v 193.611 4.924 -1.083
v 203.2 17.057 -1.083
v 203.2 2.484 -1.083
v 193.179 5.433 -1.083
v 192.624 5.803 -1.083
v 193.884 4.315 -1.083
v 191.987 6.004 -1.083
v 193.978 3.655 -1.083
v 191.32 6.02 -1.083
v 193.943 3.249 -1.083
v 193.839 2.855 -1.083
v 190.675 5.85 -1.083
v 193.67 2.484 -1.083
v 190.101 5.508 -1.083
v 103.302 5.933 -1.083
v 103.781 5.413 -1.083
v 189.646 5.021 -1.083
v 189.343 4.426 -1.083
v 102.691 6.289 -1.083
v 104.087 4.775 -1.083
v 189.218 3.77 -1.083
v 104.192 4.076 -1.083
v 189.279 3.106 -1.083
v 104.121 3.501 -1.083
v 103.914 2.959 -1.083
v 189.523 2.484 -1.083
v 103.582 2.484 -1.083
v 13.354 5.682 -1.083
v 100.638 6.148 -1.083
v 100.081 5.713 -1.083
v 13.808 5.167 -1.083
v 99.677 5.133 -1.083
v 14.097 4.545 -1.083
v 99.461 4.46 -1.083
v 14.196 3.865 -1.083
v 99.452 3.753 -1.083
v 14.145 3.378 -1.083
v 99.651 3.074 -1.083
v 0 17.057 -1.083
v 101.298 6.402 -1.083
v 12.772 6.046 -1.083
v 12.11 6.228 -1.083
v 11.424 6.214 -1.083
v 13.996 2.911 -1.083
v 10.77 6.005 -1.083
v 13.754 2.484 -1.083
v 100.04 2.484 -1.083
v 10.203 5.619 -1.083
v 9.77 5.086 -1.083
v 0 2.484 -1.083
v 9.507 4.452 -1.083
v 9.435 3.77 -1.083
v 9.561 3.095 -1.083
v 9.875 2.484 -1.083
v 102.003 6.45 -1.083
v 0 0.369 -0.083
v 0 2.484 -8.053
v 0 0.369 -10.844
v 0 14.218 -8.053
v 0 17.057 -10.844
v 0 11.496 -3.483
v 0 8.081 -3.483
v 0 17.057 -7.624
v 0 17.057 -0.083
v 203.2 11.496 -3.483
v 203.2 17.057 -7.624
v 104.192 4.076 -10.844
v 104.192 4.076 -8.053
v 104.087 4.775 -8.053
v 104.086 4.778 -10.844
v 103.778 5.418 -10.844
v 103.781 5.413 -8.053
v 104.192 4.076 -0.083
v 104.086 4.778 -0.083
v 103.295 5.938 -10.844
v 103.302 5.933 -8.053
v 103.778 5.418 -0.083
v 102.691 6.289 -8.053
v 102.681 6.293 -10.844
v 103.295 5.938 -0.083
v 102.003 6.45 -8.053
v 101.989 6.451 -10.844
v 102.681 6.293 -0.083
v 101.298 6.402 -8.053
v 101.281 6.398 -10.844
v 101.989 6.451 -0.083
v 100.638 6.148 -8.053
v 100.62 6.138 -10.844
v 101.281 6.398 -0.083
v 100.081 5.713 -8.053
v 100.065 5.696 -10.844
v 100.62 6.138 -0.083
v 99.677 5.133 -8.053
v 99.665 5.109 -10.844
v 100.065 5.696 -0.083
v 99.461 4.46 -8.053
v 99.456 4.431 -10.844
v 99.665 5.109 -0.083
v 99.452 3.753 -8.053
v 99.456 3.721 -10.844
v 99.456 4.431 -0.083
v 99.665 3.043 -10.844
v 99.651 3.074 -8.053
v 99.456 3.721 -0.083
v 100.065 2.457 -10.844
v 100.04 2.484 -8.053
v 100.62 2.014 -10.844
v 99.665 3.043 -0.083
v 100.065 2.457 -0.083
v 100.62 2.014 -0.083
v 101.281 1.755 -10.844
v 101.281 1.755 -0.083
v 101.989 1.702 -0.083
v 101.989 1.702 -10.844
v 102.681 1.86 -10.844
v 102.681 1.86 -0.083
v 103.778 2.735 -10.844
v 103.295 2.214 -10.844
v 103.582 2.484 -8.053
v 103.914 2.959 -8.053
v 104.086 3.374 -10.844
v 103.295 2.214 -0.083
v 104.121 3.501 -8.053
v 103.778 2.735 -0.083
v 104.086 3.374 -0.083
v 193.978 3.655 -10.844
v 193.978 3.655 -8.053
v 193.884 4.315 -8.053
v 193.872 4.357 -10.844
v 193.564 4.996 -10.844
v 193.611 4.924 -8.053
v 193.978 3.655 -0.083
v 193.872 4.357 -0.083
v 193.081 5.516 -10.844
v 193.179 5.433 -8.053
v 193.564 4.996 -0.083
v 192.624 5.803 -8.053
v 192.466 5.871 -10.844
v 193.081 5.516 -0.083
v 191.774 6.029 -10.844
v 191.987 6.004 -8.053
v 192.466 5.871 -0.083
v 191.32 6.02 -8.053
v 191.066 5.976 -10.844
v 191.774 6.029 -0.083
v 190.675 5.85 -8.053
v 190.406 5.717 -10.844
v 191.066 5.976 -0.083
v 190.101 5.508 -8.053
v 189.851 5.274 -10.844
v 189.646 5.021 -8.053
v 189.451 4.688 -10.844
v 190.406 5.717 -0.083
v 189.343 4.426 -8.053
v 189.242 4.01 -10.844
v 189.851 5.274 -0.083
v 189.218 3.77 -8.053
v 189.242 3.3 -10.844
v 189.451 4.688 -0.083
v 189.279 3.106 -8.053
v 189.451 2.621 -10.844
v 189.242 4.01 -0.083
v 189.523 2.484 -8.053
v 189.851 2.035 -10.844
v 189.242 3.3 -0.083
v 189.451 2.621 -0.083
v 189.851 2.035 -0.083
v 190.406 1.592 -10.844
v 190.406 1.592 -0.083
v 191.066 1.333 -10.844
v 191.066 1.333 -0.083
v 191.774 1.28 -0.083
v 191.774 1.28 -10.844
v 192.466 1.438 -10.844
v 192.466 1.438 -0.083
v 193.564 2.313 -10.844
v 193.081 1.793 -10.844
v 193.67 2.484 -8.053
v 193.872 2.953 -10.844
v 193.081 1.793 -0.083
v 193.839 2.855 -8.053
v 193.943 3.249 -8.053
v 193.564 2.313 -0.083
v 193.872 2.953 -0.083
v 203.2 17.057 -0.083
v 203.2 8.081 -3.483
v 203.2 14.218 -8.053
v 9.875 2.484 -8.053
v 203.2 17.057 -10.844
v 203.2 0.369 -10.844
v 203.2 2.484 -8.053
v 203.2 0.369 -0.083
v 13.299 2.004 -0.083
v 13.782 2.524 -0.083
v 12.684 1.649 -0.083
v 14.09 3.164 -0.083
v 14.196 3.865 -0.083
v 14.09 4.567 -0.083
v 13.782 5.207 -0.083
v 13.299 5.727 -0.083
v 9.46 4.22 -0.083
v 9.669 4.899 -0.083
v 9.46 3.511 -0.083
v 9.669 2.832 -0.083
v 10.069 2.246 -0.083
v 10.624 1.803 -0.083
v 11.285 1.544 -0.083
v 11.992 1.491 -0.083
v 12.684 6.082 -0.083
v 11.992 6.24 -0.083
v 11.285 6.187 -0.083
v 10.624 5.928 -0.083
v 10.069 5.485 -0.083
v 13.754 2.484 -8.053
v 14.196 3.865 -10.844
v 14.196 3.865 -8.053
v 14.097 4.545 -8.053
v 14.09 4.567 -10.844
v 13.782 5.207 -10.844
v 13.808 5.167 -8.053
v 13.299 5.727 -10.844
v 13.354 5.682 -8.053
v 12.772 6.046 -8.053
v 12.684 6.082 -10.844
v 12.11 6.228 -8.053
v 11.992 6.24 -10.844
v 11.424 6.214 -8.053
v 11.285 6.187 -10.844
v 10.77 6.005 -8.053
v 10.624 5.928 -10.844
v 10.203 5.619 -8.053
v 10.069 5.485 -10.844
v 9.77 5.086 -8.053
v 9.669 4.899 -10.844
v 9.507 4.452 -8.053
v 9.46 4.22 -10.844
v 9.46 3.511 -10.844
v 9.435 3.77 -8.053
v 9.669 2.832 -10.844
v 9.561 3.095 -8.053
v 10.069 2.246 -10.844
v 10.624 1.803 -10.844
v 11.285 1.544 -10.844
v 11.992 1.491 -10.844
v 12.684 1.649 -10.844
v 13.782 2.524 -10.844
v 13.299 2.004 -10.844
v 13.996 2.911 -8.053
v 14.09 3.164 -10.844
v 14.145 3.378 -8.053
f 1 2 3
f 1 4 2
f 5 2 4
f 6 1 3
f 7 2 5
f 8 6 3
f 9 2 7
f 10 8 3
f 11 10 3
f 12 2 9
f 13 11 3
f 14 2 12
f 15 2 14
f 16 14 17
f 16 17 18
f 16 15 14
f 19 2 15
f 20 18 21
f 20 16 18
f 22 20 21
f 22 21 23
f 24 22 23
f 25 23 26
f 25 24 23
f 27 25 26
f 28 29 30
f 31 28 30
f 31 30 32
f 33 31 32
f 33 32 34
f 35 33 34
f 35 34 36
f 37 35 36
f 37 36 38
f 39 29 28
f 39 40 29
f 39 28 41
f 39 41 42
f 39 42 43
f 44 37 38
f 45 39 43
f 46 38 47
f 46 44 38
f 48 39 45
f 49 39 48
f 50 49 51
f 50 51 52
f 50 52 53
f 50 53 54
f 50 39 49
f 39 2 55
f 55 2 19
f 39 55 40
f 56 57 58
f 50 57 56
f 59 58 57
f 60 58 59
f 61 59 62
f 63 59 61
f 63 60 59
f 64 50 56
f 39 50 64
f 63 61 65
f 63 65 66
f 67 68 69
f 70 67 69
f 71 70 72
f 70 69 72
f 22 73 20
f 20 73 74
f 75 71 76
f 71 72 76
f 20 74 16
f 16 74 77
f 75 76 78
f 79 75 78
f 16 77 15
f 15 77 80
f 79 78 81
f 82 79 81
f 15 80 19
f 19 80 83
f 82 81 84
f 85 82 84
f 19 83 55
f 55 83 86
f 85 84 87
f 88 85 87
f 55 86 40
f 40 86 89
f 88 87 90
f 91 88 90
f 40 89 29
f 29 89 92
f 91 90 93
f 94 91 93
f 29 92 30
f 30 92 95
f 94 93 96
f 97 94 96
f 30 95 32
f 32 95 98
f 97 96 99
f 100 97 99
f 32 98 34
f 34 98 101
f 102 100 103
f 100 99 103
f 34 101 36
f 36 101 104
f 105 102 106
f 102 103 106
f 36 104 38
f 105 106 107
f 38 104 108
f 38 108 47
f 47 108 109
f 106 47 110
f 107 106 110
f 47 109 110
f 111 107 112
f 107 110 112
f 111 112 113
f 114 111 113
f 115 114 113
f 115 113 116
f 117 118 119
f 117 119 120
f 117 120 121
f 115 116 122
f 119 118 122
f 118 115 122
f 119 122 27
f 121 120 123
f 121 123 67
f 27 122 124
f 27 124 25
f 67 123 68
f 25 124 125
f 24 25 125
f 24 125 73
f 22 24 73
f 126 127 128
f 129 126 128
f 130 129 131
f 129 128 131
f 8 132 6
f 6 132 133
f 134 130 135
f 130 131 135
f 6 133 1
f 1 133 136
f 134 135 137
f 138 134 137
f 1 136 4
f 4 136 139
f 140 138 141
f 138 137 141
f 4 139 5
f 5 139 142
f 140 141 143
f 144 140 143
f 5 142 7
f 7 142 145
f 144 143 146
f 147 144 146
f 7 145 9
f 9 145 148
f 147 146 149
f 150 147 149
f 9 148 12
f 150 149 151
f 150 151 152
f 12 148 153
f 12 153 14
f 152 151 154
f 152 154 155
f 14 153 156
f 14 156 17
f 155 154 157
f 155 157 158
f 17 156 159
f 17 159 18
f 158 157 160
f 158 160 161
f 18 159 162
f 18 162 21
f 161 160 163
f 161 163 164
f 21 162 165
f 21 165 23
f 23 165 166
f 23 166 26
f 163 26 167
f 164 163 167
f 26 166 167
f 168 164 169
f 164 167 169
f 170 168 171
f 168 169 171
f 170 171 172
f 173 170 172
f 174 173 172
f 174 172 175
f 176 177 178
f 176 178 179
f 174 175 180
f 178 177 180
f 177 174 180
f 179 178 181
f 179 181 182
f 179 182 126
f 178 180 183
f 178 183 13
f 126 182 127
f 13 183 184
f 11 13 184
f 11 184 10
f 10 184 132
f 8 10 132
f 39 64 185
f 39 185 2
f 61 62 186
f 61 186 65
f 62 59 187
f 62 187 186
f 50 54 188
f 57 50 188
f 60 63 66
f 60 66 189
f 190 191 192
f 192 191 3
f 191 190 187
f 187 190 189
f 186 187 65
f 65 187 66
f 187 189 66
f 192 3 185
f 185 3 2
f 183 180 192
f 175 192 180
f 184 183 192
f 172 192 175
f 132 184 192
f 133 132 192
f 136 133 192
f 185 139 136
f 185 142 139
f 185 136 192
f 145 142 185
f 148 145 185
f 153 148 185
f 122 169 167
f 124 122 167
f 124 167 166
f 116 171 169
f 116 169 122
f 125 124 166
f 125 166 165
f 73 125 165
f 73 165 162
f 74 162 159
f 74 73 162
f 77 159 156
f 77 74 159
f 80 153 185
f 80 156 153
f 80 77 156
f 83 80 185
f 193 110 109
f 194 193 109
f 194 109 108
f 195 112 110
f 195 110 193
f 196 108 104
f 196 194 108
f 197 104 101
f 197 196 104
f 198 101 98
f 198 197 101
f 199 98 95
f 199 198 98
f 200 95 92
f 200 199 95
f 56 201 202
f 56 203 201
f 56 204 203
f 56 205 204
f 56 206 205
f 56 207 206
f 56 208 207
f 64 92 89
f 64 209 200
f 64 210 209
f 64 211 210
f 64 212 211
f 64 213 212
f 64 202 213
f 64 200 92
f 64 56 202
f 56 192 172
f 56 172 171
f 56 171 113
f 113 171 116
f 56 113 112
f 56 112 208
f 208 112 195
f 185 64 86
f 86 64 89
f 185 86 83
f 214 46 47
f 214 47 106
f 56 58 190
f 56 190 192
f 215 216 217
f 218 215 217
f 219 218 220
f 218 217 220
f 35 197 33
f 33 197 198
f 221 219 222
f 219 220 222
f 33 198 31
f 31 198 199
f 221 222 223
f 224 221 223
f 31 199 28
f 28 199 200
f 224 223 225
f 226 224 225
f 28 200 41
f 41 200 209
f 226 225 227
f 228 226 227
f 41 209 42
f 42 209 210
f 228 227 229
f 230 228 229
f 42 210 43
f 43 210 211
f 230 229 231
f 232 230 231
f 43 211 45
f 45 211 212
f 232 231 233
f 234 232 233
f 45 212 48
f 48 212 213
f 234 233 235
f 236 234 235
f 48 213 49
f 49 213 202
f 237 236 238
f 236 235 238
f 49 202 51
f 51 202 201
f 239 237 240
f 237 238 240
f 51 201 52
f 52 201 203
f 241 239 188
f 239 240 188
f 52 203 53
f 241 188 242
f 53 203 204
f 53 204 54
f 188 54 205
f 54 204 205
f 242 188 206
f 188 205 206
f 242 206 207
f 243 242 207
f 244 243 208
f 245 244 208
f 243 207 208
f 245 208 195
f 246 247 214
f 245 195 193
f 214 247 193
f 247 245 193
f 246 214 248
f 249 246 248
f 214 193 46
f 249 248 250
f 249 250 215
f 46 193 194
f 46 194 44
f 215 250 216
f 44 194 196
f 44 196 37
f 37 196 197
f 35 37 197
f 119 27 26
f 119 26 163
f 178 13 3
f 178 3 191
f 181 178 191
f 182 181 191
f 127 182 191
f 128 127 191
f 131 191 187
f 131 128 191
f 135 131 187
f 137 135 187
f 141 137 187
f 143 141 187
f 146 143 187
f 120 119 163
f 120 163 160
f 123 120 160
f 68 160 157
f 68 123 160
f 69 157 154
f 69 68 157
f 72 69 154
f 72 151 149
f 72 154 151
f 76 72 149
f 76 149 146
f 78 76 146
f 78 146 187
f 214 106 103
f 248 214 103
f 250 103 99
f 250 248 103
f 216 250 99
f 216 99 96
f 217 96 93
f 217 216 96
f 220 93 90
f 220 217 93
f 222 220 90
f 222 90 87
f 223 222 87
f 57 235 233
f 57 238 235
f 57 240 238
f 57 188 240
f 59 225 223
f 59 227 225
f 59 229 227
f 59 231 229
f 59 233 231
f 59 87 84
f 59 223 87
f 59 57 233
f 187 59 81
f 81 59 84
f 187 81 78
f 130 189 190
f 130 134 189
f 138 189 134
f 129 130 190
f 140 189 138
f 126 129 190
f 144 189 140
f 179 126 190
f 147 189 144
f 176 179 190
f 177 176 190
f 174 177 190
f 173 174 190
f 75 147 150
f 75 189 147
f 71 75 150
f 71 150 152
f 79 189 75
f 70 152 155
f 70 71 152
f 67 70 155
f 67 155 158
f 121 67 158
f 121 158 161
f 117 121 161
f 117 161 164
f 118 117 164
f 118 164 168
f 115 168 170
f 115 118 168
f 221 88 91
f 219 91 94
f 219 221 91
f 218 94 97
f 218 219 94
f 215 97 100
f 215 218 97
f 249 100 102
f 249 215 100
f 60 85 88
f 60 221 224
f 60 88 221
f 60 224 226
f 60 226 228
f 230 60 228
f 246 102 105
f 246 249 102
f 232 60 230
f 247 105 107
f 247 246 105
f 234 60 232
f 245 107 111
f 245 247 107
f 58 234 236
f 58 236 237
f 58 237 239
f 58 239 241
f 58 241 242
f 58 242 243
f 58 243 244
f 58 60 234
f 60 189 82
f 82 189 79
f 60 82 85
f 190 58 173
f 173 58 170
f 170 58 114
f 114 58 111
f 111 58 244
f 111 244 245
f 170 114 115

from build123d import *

# Parameters (mm, degrees)
BOSS_EXTRUDE1_DEPTH = 203.2
SKETCH2_R           = 2.38125
CUT_EXTRUDE1_DEPTH  = 205.198358087


with BuildPart() as part:
    # Sketch1 → Boss-Extrude1 (new body)
    with BuildSketch(Plane(origin=(0, 0, 0), x_dir=(0, 0, -1), z_dir=(1, 0, 0))):
        Polygon((0.083005599, 0.369350394), (0.083005599, 17.056692613), (1.083005599, 17.056692613), (1.083005599, 2.484301558), (8.052601156, 2.484301558), (8.052601156, 14.217769965), (3.483005599, 8.08145593), (3.483005599, 11.495503821), (7.624316401, 17.056692613), (10.84398523, 17.056692613), (10.84398523, 0.369350394), align=None)
    extrude(amount=BOSS_EXTRUDE1_DEPTH)

    # Sketch2 → Cut-Extrude1 (cut, through all)
    with BuildSketch(Plane.XY.offset(-0.083005599)):
        with Locations((11.814414866, 3.865442963)):
            Circle(SKETCH2_R)
        with Locations((191.596349419, 3.654678679)):
            Circle(SKETCH2_R)
        with Locations((101.810764284, 4.076207247)):
            Circle(SKETCH2_R)
    extrude(amount=-CUT_EXTRUDE1_DEPTH, mode=Mode.SUBTRACT)


solid = part.part
